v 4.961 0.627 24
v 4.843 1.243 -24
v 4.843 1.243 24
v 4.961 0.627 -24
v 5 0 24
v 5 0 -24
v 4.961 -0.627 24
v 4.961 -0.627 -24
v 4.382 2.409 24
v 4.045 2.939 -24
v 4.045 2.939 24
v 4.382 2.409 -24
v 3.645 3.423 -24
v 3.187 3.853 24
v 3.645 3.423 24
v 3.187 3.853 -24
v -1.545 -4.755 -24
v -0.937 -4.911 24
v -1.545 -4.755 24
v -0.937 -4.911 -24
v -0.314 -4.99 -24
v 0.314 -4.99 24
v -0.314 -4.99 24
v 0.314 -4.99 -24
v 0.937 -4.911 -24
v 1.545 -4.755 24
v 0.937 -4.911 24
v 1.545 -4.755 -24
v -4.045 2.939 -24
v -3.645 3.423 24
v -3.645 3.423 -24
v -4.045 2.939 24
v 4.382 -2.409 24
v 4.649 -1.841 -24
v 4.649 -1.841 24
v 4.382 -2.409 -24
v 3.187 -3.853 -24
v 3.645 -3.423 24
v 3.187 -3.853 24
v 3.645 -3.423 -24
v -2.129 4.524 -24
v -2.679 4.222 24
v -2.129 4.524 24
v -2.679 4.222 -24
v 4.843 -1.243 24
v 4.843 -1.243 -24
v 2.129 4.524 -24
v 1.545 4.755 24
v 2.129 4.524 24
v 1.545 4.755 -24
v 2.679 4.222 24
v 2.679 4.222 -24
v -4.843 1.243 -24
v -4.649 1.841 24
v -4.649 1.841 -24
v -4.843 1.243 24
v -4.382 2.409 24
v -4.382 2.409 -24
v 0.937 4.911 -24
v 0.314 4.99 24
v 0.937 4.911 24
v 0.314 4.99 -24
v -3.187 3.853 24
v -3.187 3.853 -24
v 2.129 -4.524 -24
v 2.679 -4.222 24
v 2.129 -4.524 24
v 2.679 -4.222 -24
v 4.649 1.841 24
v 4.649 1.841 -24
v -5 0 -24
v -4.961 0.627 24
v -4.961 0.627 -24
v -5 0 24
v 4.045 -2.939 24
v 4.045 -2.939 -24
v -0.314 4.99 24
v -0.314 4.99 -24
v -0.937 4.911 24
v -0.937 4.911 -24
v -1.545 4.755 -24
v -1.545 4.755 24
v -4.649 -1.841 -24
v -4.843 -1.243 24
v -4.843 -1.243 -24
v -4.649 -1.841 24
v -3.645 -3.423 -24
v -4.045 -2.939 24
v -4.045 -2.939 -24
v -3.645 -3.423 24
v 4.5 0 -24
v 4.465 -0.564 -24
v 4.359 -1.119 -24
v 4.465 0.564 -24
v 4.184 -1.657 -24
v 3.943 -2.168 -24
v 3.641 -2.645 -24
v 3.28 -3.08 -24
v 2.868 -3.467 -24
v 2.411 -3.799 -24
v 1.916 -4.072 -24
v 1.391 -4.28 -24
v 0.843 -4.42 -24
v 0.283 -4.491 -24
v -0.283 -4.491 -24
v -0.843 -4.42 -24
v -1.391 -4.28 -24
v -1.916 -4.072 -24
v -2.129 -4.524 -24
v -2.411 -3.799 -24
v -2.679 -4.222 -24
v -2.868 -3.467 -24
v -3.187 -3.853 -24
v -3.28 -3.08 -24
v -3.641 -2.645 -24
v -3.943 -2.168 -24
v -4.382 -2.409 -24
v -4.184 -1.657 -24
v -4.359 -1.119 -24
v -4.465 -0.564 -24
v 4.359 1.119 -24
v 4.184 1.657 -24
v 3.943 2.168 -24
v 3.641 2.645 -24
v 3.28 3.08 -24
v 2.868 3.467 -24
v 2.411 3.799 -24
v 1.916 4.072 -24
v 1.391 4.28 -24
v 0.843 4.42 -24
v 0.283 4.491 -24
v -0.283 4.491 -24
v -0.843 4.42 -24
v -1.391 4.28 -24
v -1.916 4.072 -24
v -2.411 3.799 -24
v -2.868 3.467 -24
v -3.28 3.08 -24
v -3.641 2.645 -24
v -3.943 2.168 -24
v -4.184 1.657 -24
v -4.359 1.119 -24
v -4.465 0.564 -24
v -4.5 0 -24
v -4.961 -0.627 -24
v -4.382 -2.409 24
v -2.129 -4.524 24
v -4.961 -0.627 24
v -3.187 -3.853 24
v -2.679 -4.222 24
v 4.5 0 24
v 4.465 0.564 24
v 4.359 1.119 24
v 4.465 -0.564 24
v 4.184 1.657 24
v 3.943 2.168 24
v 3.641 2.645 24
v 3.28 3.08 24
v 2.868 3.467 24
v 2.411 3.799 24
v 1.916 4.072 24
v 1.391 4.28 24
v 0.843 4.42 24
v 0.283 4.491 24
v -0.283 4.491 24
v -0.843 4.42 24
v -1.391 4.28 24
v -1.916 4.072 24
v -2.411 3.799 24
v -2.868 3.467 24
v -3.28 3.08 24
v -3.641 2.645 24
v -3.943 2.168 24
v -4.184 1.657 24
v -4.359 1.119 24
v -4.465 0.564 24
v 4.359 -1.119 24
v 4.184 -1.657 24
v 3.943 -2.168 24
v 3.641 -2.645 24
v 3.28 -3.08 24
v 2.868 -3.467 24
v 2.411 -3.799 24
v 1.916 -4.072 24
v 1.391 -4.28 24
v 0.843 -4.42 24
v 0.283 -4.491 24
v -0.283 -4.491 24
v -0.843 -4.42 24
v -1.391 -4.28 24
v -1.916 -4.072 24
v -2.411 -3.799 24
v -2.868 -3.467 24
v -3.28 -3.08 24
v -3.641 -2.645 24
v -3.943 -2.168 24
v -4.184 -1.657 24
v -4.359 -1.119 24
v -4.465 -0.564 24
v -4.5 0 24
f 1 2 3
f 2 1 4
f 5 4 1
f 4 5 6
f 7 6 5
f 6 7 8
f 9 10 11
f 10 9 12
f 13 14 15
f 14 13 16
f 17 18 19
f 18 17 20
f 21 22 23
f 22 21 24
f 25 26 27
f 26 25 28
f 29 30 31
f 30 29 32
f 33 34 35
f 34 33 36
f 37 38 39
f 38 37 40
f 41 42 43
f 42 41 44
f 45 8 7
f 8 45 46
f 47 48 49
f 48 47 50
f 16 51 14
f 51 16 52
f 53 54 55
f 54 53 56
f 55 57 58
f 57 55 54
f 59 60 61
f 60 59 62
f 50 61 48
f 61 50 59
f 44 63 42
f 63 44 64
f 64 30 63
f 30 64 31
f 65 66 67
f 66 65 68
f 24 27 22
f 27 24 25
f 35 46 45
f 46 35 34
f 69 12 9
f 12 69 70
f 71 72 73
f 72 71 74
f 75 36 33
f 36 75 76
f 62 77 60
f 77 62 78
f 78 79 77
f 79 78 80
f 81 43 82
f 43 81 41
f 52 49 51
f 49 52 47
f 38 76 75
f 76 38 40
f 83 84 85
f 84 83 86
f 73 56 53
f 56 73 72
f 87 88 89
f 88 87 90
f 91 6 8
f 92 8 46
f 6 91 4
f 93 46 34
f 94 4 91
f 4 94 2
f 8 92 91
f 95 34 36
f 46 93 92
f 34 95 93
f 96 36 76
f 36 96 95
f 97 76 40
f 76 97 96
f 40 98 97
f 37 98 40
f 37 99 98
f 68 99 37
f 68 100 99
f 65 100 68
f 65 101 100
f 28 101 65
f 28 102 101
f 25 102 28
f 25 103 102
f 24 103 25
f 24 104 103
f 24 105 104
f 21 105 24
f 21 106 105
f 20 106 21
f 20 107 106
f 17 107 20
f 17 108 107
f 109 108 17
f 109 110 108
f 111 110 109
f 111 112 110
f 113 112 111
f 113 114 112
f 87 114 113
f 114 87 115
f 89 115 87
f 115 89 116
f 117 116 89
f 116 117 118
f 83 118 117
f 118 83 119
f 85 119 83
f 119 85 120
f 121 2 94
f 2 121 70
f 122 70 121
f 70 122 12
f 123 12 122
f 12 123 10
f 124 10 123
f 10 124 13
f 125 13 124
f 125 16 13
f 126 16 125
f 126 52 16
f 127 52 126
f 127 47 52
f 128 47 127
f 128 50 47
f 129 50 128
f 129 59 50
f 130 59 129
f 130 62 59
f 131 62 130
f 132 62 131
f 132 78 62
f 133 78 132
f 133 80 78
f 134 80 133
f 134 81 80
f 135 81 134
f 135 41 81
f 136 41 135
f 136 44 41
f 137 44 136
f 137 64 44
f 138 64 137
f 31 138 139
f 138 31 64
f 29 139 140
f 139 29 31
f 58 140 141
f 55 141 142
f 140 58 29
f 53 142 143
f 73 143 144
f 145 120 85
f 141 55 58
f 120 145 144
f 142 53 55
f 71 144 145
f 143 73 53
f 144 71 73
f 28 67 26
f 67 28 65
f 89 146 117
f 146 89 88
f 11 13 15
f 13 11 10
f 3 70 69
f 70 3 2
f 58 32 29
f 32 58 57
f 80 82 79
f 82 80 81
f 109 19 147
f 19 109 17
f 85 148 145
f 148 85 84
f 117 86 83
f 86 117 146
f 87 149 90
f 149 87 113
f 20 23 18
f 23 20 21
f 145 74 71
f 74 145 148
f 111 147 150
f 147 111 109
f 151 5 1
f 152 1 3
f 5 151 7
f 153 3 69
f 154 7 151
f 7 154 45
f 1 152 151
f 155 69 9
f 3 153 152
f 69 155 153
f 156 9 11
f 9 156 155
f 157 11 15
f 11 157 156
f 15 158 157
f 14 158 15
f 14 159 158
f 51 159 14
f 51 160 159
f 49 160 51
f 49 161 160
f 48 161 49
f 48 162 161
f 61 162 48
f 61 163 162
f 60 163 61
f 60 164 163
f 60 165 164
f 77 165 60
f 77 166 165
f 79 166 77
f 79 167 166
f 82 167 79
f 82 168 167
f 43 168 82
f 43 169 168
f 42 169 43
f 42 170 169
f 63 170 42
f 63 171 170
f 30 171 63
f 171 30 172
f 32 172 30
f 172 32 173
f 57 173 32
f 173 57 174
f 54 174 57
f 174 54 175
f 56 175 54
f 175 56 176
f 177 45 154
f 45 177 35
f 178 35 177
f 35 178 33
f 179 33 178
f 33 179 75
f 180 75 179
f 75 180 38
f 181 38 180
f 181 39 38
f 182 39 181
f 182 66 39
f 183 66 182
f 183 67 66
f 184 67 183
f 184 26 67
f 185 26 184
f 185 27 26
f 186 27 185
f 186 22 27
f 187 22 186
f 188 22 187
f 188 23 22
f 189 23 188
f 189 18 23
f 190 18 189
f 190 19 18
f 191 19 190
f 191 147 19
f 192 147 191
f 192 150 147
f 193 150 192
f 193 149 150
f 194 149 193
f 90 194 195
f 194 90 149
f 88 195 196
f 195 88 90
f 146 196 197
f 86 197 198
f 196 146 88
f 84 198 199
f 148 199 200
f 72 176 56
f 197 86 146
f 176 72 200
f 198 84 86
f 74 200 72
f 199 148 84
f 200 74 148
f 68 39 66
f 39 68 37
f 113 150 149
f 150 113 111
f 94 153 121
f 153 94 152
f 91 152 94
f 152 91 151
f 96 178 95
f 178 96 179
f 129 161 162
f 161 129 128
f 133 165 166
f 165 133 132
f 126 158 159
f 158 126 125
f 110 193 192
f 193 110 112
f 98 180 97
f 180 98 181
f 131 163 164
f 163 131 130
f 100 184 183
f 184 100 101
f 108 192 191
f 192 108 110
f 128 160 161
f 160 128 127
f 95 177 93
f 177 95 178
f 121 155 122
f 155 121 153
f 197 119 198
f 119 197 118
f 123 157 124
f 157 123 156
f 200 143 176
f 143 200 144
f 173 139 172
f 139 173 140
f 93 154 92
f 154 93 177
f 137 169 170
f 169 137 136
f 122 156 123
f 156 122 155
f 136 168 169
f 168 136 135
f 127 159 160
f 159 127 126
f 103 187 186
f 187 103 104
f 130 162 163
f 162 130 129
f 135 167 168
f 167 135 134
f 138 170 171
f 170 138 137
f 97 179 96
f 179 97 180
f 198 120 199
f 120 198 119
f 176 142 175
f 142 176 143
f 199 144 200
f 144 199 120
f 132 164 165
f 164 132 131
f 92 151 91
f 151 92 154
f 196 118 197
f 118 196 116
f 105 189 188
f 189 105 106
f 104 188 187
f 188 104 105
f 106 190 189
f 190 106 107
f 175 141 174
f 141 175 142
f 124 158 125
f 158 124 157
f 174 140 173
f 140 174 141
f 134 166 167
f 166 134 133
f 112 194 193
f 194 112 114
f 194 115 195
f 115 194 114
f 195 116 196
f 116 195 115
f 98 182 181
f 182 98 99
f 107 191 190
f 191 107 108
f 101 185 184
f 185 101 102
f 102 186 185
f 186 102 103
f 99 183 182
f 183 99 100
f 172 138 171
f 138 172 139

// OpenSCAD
$fn = 50;


difference() {
	union() {
		translate(v = [0, 0, -24.0000000000]) {
			cylinder(h = 48, r = 5.0000000000);
		}
	}
	union() {
		translate(v = [0, 0, -100.0000000000]) {
			cylinder(h = 200, r = 4.5000000000);
		}
	}
}
